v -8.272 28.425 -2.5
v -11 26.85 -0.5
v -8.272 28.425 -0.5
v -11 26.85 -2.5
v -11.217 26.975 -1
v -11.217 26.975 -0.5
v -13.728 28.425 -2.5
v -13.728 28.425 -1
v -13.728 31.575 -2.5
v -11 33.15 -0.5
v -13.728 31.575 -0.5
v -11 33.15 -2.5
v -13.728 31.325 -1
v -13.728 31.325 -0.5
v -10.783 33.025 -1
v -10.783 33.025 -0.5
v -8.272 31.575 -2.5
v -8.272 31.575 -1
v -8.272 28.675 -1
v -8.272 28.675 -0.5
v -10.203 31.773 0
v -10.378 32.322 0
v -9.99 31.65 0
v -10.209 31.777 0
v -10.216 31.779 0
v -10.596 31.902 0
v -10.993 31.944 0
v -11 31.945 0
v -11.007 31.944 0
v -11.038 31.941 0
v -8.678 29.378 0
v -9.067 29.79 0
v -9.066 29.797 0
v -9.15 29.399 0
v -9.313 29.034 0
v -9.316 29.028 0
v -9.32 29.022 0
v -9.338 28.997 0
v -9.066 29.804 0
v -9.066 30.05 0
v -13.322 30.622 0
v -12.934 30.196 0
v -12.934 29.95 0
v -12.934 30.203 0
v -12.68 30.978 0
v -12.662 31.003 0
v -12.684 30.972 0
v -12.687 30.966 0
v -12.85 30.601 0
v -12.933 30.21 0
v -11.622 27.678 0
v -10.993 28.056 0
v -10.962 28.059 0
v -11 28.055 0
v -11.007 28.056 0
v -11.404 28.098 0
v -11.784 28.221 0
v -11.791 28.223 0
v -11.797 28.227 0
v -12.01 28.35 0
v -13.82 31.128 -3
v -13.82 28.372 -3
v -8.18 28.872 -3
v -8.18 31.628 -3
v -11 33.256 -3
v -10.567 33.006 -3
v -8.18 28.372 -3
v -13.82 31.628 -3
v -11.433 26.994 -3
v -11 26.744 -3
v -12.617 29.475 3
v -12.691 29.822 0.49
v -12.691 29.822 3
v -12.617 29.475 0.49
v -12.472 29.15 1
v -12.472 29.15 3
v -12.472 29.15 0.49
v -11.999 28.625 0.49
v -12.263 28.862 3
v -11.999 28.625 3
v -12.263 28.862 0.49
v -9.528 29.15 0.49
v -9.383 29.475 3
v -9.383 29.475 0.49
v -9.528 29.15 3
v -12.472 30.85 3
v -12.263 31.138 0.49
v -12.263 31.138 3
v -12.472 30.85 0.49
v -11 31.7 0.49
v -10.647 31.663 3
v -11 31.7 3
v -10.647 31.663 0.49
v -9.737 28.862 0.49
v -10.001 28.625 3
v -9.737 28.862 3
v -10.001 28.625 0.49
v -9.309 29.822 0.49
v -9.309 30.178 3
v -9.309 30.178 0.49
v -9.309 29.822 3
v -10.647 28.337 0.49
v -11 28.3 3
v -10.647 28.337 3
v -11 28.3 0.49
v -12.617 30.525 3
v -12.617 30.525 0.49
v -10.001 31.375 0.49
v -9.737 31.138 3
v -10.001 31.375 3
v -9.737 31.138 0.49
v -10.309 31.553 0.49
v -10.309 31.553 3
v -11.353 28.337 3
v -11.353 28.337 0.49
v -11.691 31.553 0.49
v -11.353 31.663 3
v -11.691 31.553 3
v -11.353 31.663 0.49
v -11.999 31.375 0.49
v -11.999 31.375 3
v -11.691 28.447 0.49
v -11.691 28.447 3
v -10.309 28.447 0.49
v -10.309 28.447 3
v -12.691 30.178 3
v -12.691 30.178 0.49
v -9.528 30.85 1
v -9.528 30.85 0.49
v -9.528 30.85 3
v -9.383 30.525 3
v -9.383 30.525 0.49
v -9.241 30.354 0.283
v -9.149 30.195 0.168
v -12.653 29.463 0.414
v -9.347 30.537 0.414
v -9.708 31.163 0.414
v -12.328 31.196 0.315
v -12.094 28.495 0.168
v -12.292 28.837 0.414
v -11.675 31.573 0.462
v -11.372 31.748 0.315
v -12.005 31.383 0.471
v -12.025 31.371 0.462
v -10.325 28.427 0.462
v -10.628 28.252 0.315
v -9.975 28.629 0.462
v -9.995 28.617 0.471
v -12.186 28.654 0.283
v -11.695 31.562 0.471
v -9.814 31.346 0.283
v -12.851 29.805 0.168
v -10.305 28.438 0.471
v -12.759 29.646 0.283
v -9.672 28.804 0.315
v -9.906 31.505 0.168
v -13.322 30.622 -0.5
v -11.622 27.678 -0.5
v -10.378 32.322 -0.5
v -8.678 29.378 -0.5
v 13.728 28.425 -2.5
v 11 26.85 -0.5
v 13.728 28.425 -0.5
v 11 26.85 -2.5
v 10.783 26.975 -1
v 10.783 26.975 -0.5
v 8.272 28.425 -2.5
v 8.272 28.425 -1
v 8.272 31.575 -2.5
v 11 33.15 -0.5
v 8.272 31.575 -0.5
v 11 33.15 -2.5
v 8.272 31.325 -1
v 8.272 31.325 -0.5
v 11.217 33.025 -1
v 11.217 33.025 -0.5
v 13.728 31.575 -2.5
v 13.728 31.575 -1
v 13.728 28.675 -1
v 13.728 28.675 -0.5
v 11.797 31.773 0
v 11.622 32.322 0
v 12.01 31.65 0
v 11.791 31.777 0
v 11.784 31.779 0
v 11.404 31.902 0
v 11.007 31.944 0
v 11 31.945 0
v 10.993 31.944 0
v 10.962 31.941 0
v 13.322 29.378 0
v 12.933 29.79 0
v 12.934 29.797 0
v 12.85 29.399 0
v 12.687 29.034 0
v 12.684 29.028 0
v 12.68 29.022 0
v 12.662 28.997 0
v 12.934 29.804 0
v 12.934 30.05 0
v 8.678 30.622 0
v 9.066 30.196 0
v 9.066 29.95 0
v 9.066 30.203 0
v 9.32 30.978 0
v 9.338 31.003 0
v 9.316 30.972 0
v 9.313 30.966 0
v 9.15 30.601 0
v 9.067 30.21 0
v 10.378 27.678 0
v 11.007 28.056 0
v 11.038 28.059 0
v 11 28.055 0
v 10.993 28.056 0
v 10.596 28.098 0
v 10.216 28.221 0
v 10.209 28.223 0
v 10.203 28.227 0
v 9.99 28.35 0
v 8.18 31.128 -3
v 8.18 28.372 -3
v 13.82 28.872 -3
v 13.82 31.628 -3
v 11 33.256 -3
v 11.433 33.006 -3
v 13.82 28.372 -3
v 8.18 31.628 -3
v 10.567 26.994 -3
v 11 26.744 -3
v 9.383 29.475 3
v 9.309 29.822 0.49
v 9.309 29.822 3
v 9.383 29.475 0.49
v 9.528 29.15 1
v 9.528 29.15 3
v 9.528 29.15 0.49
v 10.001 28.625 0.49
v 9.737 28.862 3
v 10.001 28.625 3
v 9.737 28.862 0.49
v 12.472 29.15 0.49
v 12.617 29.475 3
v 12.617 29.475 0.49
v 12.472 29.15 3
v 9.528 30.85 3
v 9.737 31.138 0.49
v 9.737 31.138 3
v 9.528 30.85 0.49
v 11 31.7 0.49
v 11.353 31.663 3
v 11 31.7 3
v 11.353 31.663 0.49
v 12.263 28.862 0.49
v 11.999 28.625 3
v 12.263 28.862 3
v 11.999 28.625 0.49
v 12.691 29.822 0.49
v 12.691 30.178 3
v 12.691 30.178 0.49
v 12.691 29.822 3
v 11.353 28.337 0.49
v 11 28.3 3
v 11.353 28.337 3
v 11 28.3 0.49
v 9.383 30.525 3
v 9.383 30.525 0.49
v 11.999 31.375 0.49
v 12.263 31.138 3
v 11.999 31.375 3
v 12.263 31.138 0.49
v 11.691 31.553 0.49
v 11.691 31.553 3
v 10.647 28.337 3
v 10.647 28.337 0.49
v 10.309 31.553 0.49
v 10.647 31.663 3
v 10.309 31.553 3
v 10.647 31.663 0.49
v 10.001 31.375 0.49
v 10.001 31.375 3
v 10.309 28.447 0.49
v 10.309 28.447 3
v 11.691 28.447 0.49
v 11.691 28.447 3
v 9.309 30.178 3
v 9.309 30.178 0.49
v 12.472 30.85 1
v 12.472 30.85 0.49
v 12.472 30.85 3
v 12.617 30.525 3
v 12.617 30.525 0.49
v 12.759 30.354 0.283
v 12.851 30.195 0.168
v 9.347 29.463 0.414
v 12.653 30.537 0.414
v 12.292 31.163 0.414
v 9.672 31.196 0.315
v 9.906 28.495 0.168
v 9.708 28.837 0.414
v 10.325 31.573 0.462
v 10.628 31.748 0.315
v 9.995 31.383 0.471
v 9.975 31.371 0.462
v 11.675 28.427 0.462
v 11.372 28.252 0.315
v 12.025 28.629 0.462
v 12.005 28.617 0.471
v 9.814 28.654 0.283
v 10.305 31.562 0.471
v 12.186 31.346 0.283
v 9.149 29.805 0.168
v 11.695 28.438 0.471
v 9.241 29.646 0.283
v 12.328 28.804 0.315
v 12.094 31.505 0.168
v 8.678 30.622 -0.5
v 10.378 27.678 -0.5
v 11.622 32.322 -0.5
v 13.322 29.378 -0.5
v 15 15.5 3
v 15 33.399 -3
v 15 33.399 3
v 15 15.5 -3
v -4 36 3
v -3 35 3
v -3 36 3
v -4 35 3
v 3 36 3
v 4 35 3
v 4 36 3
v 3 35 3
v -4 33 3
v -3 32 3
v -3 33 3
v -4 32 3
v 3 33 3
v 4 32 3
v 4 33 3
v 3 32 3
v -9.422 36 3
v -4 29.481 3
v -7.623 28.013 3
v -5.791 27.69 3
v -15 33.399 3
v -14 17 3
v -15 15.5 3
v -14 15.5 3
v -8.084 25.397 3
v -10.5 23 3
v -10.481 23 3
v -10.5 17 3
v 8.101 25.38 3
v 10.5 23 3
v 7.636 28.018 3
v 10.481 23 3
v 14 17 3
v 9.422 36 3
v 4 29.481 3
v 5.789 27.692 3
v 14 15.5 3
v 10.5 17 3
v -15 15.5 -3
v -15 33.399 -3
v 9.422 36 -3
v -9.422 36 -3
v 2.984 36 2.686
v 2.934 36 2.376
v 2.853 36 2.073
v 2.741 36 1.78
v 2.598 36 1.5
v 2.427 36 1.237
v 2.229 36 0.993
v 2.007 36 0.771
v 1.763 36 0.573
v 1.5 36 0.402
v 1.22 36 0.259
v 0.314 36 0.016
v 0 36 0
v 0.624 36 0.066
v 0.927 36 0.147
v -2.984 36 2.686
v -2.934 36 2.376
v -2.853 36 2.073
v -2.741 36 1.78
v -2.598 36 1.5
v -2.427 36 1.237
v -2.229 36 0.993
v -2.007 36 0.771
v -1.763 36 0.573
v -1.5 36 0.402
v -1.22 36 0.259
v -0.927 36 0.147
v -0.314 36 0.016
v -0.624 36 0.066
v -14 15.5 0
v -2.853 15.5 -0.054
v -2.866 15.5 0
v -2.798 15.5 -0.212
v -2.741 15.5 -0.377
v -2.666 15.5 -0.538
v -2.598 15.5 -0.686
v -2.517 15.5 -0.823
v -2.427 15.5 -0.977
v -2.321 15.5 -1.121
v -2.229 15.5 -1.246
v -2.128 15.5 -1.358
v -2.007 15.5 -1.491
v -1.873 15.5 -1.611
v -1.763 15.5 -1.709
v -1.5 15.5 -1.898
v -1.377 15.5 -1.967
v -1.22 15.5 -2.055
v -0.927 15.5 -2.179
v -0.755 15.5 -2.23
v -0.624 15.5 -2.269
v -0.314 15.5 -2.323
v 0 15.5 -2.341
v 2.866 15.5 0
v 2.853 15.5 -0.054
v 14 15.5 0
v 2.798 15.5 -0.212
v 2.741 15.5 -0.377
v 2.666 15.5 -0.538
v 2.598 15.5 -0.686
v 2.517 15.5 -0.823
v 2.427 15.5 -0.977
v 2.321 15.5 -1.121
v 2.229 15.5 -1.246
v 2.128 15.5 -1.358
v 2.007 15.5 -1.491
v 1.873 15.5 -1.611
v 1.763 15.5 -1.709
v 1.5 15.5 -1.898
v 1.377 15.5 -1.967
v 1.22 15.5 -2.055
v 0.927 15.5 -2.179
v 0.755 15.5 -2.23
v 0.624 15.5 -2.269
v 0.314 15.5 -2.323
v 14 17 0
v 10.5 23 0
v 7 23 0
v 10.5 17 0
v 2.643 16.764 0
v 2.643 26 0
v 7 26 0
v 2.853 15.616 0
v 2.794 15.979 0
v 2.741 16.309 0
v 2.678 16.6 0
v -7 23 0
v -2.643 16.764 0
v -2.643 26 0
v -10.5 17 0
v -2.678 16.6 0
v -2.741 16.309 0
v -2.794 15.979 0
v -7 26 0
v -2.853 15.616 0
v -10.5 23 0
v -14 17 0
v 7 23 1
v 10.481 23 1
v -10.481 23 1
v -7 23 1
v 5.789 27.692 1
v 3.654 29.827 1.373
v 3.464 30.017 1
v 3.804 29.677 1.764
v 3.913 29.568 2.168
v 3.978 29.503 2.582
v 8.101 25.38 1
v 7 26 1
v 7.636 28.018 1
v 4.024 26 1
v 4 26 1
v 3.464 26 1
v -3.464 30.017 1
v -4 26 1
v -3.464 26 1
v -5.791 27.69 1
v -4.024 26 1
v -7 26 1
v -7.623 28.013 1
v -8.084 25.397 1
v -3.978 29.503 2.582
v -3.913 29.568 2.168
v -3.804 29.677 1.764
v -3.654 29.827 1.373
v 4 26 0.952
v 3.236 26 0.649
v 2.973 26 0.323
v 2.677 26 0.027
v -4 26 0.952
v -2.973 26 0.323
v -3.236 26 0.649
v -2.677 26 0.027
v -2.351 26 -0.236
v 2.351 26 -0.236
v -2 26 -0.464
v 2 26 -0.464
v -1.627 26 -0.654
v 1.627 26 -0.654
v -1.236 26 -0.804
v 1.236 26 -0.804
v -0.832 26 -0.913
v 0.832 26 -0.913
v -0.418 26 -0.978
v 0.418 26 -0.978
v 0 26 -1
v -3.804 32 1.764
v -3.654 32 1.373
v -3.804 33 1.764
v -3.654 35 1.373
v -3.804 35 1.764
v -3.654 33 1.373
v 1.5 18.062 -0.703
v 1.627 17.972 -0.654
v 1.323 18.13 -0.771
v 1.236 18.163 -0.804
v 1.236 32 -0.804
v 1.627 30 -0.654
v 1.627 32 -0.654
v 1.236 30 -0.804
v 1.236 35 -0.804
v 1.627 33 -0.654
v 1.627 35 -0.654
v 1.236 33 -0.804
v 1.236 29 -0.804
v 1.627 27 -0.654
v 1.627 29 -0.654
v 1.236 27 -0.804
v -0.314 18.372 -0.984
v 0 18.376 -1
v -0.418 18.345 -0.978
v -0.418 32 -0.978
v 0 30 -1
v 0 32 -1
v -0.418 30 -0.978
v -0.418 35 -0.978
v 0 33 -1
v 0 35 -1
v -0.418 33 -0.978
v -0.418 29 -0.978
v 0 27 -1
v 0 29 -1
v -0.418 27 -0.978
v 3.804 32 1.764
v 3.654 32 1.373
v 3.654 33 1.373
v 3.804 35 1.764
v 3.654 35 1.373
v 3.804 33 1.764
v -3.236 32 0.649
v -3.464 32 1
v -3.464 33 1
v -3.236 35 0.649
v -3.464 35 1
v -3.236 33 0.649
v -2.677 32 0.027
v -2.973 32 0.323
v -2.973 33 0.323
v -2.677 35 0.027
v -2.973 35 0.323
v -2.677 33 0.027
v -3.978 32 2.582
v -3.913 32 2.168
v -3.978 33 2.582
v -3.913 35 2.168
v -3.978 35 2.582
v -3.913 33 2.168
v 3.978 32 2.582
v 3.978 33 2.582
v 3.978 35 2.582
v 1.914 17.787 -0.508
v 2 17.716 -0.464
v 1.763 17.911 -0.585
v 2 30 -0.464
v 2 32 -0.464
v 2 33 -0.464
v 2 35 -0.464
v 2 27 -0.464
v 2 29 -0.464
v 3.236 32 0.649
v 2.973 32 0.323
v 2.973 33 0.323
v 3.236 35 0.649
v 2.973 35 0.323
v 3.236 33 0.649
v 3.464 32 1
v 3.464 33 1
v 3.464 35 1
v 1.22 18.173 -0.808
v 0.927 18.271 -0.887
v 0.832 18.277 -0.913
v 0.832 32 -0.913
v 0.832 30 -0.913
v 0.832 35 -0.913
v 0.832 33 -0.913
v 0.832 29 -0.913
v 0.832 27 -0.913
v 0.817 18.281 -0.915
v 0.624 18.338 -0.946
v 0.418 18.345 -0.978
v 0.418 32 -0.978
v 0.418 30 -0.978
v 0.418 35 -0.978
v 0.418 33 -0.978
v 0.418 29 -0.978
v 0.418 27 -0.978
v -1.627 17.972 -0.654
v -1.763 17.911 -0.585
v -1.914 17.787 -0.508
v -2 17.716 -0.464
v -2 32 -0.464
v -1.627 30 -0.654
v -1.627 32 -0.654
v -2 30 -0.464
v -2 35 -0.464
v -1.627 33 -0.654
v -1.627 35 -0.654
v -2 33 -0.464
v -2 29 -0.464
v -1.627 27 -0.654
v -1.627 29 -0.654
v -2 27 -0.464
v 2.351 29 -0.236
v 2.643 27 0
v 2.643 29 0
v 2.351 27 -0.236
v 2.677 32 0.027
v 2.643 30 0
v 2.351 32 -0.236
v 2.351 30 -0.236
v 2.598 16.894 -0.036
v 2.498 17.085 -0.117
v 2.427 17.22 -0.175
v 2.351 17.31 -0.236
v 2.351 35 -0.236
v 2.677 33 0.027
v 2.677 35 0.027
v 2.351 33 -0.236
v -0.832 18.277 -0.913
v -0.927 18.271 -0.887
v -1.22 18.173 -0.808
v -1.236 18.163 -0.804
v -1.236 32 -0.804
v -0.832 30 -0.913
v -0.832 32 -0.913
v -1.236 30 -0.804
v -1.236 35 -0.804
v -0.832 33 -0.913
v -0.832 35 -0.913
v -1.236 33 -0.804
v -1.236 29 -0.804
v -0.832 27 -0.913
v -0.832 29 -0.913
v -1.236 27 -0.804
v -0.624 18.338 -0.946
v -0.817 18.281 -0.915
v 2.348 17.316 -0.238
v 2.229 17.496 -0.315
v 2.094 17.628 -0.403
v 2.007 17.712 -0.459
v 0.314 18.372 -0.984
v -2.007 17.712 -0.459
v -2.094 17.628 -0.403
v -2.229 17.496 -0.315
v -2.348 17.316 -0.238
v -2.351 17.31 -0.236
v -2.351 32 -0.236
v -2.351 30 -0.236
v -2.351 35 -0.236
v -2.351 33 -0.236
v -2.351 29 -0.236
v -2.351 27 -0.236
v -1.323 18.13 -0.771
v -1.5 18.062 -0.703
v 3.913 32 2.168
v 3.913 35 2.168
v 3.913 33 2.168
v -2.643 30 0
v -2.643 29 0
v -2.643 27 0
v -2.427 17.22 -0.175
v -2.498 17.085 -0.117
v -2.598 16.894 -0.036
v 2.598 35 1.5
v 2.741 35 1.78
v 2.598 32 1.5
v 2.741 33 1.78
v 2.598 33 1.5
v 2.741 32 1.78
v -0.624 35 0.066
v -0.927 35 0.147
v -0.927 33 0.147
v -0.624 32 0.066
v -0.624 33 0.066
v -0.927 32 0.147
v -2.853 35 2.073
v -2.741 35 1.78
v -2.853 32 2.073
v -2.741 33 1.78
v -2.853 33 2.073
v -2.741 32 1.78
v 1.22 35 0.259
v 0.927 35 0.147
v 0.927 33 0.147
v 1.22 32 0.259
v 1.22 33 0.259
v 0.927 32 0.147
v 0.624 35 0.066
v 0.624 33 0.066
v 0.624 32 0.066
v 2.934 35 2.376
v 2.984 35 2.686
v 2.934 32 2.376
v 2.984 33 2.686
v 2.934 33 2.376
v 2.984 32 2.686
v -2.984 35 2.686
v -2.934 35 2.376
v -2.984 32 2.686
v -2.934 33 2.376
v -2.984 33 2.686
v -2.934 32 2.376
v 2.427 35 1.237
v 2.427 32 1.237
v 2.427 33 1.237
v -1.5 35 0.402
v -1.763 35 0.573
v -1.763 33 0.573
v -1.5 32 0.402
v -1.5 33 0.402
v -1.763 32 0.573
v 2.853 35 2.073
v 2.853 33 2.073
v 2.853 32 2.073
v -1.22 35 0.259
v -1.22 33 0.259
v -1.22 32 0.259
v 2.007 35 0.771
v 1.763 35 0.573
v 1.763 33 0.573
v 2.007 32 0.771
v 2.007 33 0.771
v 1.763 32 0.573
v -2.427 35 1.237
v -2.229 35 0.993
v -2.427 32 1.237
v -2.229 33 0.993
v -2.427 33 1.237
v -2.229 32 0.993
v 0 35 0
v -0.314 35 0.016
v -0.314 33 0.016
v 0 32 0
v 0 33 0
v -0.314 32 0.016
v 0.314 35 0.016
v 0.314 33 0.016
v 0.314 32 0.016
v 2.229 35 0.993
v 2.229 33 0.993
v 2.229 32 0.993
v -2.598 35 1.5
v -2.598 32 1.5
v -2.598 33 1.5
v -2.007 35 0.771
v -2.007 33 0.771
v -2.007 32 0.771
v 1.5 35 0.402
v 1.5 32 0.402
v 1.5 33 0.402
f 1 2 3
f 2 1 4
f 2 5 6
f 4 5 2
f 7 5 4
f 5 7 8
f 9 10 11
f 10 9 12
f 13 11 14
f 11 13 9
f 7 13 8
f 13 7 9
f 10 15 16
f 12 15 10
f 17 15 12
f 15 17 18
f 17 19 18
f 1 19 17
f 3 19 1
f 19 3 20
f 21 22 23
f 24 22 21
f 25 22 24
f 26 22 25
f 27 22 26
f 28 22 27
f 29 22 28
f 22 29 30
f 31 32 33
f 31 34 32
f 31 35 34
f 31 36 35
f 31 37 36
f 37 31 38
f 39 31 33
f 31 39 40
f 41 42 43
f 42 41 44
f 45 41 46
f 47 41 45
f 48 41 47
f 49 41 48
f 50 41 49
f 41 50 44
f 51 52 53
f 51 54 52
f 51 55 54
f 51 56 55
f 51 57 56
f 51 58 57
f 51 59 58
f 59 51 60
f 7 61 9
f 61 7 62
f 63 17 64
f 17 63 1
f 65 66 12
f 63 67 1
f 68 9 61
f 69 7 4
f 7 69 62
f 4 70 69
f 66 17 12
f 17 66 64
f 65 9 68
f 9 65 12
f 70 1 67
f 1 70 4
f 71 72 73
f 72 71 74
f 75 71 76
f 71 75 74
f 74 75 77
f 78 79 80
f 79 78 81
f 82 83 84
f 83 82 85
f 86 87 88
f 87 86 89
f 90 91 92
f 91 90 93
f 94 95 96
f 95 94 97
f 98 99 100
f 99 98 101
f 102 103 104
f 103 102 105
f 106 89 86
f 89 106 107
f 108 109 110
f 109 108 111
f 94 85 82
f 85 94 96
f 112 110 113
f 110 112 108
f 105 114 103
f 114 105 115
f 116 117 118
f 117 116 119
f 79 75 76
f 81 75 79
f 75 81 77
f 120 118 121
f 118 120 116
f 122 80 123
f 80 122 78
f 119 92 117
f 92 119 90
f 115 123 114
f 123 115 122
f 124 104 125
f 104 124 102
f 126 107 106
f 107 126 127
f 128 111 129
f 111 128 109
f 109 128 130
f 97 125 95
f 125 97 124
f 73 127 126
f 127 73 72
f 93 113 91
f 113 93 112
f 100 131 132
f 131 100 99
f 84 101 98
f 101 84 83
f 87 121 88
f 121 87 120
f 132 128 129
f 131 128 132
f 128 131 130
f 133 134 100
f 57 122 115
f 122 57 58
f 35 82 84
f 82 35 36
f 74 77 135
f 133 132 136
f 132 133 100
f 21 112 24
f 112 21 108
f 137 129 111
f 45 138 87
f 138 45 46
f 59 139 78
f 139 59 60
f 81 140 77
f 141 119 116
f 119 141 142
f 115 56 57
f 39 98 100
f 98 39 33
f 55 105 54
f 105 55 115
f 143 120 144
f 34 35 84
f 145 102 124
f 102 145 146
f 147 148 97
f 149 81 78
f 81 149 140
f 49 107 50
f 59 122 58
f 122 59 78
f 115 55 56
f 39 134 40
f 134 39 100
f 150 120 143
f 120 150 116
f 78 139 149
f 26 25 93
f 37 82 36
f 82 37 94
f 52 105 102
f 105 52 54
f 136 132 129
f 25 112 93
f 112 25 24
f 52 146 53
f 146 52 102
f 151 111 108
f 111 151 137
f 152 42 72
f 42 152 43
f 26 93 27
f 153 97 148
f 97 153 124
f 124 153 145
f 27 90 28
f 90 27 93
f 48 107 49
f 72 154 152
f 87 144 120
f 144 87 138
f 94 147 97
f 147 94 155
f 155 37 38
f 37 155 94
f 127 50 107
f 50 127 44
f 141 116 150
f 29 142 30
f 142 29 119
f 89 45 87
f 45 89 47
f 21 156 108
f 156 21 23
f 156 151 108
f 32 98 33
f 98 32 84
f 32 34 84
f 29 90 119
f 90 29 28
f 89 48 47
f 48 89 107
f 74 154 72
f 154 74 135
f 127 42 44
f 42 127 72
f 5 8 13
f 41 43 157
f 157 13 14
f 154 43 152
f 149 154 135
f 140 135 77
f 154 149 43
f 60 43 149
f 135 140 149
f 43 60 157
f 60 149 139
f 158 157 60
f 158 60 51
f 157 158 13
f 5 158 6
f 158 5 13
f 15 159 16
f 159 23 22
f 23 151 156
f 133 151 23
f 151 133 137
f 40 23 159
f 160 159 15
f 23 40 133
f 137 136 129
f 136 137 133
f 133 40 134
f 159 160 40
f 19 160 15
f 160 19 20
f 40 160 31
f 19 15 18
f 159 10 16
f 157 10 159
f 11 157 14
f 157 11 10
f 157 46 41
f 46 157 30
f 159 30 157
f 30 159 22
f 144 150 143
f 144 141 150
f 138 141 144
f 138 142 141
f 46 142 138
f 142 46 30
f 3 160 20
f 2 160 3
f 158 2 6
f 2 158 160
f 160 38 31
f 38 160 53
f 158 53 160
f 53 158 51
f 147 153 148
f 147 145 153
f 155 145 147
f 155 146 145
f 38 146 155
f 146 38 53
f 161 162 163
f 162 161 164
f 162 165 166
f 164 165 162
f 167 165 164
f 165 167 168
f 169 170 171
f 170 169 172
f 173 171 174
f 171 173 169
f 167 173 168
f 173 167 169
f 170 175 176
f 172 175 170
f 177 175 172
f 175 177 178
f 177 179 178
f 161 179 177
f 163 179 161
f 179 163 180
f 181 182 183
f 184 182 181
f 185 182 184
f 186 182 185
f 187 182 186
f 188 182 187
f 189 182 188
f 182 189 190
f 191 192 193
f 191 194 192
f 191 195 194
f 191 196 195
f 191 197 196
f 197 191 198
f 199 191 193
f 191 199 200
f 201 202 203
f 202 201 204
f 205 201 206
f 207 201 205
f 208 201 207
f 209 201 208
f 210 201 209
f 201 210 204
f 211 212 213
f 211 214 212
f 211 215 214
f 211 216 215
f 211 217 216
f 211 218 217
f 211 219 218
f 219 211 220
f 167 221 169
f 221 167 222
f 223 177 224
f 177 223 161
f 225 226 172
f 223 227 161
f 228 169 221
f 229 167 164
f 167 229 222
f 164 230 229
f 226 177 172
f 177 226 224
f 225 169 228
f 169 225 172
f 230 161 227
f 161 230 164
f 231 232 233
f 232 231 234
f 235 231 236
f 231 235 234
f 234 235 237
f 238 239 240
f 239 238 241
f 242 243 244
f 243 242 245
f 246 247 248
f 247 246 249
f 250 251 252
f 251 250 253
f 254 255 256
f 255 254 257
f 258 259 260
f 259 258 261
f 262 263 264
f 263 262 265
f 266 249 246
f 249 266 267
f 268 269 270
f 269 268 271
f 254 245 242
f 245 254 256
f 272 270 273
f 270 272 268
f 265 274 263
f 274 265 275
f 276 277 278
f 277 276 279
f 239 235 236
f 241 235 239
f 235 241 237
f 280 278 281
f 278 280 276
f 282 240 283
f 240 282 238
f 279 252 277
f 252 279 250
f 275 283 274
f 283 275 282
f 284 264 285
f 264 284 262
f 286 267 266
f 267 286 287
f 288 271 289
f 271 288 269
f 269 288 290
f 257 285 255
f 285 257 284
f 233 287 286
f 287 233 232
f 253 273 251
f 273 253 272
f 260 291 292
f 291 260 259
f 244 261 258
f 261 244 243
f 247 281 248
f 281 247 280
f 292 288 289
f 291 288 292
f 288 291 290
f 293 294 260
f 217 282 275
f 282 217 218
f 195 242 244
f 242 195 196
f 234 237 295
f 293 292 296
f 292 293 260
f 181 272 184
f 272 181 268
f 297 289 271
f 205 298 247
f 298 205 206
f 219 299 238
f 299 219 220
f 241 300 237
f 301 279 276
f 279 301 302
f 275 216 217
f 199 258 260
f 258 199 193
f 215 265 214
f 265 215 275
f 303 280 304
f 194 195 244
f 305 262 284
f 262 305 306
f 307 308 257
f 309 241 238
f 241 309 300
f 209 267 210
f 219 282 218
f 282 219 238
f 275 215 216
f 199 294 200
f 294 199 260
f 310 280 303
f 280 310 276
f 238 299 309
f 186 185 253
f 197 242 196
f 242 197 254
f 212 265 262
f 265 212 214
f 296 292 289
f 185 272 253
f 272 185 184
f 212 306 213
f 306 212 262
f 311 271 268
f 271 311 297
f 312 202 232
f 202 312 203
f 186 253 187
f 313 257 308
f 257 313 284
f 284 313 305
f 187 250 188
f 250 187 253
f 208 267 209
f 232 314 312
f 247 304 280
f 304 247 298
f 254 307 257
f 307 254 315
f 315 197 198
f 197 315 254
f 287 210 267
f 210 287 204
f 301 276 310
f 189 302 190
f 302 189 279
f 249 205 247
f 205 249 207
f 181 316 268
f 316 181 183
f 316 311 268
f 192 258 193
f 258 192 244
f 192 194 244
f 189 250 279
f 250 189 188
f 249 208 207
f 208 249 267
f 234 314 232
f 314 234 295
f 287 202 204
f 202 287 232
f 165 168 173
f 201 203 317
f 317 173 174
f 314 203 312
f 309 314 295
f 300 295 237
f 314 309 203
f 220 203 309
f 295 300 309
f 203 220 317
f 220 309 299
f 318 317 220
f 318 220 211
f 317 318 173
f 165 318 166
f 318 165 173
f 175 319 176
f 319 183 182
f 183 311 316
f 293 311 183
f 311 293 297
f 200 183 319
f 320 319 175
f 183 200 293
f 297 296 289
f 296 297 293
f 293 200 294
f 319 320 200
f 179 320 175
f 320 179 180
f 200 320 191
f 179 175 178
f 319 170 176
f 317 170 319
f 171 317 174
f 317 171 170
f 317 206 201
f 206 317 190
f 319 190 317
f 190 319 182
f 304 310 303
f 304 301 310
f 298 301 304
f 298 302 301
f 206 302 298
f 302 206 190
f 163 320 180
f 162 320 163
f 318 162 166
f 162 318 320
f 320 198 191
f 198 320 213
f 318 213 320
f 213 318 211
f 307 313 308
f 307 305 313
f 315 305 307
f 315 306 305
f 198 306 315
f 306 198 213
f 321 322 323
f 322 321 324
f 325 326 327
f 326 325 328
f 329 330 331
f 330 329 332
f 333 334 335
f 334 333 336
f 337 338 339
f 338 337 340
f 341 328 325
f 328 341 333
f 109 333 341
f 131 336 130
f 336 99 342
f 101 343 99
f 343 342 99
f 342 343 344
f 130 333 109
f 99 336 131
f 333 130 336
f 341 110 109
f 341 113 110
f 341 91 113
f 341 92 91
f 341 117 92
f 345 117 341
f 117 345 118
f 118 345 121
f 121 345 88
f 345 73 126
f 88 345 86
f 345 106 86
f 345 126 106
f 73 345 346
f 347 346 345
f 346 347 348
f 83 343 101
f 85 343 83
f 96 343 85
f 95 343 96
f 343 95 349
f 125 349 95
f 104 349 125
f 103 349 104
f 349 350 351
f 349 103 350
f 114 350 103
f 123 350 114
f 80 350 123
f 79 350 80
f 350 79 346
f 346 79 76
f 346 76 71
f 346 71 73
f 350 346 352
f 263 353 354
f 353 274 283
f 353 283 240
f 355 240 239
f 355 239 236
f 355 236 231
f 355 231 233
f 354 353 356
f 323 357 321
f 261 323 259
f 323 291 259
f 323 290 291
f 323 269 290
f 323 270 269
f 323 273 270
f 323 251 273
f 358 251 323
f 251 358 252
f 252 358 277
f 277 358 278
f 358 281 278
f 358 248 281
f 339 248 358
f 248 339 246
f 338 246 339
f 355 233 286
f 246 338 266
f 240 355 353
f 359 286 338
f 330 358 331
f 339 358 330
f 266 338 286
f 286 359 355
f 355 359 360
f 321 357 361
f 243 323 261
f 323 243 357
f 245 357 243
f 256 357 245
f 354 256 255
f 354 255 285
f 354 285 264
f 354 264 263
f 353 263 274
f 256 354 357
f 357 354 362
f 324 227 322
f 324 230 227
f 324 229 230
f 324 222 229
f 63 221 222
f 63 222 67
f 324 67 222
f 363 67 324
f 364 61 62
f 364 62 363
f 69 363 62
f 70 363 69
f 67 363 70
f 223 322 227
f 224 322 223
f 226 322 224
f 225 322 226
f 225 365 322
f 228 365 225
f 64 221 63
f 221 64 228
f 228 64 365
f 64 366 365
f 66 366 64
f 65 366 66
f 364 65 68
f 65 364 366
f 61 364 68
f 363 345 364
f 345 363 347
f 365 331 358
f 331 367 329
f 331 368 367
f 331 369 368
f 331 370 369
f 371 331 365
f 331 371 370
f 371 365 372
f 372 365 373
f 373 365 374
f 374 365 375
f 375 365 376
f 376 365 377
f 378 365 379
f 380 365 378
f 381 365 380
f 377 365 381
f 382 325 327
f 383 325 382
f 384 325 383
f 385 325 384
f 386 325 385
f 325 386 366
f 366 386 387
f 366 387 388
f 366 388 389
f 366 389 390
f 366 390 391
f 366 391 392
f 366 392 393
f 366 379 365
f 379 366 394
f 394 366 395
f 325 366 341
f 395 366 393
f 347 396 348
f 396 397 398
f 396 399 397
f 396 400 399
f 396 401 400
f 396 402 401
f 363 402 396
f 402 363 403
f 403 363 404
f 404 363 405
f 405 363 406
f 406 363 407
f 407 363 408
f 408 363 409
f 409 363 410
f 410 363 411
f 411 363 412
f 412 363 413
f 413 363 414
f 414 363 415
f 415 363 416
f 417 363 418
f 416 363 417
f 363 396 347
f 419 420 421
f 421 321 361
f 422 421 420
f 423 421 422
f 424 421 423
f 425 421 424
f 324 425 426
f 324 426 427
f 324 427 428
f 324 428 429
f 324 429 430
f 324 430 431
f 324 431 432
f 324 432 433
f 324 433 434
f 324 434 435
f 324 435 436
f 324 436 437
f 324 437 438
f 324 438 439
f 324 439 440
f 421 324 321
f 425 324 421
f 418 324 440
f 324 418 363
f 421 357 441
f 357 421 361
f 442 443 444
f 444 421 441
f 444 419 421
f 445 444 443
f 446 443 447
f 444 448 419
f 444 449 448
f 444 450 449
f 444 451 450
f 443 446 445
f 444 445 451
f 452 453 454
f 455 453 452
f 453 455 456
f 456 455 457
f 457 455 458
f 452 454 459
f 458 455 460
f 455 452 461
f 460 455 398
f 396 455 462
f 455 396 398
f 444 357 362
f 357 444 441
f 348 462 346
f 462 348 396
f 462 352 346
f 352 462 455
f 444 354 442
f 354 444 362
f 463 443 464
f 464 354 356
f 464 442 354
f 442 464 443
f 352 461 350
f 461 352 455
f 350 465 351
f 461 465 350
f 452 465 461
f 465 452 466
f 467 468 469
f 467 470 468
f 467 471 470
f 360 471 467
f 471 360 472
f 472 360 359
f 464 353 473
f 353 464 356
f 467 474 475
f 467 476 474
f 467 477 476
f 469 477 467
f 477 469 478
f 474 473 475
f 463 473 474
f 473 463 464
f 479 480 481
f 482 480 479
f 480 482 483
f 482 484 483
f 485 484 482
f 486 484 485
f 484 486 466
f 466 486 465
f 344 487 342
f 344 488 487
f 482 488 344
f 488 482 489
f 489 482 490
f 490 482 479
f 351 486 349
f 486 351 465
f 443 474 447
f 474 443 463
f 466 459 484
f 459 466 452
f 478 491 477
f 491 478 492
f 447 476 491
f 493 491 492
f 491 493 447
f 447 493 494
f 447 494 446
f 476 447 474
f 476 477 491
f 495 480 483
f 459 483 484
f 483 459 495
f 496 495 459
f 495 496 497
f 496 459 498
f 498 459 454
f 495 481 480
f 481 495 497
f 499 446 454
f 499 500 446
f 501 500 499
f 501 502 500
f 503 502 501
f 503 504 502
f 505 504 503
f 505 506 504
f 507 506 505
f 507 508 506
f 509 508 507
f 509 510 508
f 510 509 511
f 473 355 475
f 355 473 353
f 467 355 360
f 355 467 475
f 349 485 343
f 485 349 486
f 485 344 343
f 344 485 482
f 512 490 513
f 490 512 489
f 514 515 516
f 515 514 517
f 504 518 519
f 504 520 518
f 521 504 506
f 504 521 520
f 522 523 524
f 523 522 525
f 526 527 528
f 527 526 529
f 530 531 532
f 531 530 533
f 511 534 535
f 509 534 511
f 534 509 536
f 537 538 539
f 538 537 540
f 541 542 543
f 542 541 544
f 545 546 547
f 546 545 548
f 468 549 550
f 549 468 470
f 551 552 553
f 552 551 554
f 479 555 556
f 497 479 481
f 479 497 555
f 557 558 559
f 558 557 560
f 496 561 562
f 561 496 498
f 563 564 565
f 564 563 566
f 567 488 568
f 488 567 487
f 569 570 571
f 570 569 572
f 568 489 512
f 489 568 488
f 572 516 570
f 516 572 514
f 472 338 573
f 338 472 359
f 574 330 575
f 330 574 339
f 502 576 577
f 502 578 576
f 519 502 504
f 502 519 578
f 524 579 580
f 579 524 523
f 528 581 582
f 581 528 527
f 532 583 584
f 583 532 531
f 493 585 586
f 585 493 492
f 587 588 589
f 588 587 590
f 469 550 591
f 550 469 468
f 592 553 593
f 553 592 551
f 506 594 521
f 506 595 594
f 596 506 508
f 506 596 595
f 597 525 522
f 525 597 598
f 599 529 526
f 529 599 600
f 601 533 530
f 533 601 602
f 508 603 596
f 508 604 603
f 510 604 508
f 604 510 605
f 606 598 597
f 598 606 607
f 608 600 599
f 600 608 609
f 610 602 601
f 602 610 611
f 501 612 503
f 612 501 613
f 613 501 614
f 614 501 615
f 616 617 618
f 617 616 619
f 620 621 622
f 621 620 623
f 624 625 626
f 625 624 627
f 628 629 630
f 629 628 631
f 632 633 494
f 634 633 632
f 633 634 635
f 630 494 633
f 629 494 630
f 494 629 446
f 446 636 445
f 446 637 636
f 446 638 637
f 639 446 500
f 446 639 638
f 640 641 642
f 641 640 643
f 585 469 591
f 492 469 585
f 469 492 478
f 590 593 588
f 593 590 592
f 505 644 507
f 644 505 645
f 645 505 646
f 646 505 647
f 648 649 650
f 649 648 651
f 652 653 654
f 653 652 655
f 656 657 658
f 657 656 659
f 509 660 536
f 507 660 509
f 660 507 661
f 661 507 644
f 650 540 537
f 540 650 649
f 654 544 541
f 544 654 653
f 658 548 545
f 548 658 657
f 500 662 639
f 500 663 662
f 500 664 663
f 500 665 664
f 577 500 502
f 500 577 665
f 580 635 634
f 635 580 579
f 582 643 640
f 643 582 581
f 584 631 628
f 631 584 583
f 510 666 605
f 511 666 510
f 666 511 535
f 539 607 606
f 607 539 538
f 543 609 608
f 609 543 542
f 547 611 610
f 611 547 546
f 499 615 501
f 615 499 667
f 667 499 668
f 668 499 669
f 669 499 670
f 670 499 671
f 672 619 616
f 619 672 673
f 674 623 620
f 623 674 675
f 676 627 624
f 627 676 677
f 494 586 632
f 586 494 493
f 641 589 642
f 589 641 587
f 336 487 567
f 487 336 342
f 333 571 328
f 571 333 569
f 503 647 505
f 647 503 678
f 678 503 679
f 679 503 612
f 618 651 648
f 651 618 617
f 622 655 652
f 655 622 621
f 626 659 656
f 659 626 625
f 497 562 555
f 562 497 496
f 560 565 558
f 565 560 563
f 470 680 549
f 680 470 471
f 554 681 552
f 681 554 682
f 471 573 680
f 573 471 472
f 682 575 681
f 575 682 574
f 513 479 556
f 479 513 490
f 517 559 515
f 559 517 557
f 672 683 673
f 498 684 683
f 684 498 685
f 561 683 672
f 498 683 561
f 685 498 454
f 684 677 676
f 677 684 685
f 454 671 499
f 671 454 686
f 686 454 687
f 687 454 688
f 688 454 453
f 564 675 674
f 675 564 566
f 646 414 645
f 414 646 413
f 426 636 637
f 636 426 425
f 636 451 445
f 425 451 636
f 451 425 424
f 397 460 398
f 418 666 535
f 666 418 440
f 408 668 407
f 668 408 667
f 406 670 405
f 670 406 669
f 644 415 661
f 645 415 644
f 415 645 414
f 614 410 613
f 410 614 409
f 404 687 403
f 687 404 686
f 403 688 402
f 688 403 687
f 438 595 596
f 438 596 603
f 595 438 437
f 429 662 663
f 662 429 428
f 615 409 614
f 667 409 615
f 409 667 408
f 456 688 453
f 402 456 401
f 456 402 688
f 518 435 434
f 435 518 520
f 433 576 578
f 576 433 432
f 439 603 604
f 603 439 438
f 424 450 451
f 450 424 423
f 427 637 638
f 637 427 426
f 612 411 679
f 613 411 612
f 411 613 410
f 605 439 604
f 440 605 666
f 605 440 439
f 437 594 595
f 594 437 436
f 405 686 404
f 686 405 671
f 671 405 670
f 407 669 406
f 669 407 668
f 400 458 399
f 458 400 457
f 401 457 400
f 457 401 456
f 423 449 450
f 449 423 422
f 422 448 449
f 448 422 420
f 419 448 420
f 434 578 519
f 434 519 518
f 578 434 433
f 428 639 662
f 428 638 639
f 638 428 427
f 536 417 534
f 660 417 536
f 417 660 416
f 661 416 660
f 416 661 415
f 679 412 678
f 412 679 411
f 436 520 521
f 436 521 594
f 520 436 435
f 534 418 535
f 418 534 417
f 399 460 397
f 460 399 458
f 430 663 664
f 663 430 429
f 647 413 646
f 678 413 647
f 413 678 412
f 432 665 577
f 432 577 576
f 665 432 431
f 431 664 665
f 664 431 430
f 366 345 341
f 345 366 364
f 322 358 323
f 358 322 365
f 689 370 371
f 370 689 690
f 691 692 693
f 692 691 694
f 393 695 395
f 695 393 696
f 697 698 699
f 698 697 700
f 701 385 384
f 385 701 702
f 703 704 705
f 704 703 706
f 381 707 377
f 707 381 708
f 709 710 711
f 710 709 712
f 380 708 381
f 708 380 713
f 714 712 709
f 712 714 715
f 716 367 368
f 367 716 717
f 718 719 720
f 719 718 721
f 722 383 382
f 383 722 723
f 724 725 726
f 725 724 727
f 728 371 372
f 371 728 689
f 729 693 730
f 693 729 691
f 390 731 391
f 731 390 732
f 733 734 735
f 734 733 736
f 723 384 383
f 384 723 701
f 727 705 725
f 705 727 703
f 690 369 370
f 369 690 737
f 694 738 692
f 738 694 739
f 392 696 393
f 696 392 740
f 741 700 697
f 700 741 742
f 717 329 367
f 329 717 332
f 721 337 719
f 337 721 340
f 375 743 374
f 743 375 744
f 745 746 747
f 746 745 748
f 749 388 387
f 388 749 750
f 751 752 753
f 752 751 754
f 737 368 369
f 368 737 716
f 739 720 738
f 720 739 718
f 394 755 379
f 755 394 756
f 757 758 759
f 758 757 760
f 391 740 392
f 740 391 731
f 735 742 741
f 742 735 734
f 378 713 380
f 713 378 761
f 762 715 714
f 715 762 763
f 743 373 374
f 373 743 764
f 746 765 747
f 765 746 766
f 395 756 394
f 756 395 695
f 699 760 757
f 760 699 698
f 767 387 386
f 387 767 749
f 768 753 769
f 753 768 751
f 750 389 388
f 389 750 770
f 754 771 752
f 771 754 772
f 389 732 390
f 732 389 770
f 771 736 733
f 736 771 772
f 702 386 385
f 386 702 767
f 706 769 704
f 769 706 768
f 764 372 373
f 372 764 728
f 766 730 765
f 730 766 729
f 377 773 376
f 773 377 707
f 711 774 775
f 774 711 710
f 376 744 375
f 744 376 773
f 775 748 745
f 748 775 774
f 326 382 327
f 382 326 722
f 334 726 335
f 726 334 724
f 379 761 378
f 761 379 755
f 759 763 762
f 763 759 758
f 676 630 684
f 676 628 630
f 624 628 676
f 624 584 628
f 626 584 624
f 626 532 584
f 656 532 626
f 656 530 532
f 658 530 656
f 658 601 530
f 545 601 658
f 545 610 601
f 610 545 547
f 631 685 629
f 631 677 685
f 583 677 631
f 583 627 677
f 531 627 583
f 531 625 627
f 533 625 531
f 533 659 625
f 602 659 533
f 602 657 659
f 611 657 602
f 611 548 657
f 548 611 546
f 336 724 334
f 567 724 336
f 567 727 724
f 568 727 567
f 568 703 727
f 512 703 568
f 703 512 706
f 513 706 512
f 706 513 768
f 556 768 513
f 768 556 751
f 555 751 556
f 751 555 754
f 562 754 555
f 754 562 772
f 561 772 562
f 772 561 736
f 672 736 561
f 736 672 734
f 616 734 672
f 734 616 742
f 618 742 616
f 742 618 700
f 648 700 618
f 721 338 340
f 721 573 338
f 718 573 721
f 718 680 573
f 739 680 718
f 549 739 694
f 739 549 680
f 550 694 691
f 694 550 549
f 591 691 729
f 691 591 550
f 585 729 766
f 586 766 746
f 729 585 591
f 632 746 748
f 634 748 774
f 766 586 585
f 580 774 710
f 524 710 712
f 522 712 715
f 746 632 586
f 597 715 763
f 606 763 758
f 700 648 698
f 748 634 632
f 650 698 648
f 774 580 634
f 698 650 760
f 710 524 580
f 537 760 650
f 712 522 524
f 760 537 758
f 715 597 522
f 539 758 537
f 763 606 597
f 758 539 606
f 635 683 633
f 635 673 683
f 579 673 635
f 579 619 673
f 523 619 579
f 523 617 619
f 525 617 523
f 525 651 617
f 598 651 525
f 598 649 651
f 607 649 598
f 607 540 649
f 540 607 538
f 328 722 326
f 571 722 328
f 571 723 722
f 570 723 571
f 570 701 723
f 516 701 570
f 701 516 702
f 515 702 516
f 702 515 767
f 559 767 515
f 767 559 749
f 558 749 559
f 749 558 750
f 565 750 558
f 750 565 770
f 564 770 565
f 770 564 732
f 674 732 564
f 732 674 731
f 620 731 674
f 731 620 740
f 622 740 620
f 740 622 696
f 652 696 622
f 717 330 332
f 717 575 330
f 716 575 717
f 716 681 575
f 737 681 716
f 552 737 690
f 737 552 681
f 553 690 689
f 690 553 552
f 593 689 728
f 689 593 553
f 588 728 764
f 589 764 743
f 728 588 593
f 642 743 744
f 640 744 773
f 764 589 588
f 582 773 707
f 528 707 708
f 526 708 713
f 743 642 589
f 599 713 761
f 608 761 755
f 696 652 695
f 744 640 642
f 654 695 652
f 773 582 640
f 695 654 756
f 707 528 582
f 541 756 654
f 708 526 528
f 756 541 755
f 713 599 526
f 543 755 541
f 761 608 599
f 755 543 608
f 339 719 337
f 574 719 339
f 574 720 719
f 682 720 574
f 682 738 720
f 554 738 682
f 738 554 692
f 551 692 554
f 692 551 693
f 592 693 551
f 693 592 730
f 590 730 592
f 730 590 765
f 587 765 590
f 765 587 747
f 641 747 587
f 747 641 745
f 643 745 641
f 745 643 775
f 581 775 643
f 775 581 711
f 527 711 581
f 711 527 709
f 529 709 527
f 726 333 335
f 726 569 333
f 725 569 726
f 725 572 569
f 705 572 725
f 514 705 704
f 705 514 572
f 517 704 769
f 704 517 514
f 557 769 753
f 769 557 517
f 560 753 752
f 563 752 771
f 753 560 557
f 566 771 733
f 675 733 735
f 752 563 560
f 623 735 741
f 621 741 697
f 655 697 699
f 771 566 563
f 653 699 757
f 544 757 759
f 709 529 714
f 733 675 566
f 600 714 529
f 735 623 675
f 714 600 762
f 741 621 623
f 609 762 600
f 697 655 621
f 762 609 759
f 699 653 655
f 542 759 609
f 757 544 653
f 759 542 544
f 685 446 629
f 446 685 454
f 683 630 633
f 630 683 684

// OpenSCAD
// PRUSA iteration4
// Heatbed cable cover clip MK3S
// GNU GPL v3
// Josef Průša <iam@josefprusa.cz> and contributors
// http://www.reprap.org/wiki/Prusa_Mendel
// http://prusamendel.org

module m3_nut() {
  difference() {
    union() {
      cylinder(h=4, r=3.15, $fn=6);
      translate([0, 0, 2.5]) cylinder(h=4, r1=3.15, r2=4, $fn=6);
      translate([0, 0, -9]) cylinder(h=12, r=1.7, $fn=30);
      translate([0, 0, -0.49]) cylinder(h=0.5, r1=1.7, r2=1.95, $fn=30);
    }
    translate([1.7, -5, -1]) cube([5, 10, 2]);
    translate([-6.7, -5, -1]) cube([5, 10, 2]);

    translate([-5, 1.7, -1.5]) cube([10, 5, 2]);
    translate([-5, -6.7, -1.5]) cube([10, 5, 2]);
  }
}

module clip() {

  difference() {
    // base body
    translate([-15, 15.5, -3]) cube([30, 20.5, 6]);

    // inner angled cut
    translate([3.5, 2, 0]) rotate([0, 0, 0]) cube([10.5, 15, 6]);
    translate([-14, 2, 0]) rotate([0, 0, 0]) cube([10.5, 15, 6]);

    translate([3.5, 15, 0]) rotate([0, 0, 0]) cube([7, 8, 6]);
    translate([-10.5, 15, 0]) rotate([0, 0, 0]) cube([7, 8, 6]);

    translate([6.96, 19.45, 1]) rotate([0, 0, 45]) cube([5, 10, 6]);
    translate([-6.96, 19.45, 1]) rotate([0, 0, 45]) cube([10, 5, 6]);

    translate([-0, 37, 3]) rotate([90, 0, 0]) cylinder(h=17, r=3.5, $fn=60);

    translate([-7, 15, 0]) rotate([0, 0, 0]) cube([14, 11, 6]);

    translate([3, 14, 1]) rotate([0, 0, 10]) cube([7, 13, 6]);
    translate([-9.88, 15.21, 1]) rotate([0, 0, -10]) cube([7, 13, 6]);

    // cables cut
    translate([-0, 36, 3]) rotate([90, 0, 0]) cylinder(h=187, r=4, $fn=60);

    translate([-11, 30, 0]) rotate([0, 180, 30]) m3_nut();
    translate([11, 30, 0]) rotate([0, 180, 30]) m3_nut();

    // thermistor cable entry
    translate([-0, 22, 4]) rotate([115, 0, 0]) cylinder(h=15, r=3, $fn=60);

    // edges  
    translate([-18.0, 32, -5]) rotate([0, 0, 25]) cube([11, 11, 15]);
    translate([18, 32, -5]) rotate([0, 0, 65]) cube([11, 11, 15]);
  }

  // cable rims
  difference() {
    difference() {
      translate([-0, 36, 3]) rotate([90, 0, 0]) cylinder(h=10, r=4.5, $fn=60);
      translate([-0, 37, 3]) rotate([90, 0, 0]) cylinder(h=17, r=3, $fn=60);
    }
    translate([-15, 18, 3]) cube([30, 20, 6]);
    translate([-15, 27, -5]) cube([30, 2, 16]);
    translate([-15, 30, -5]) cube([30, 2, 16]);
    translate([-15, 33, -5]) cube([30, 2, 16]);
    translate([6.96, 19.45, 1]) rotate([0, 0, 45]) cube([5, 10, 6]);
    translate([-6.96, 19.45, 1]) rotate([0, 0, 45]) cube([10, 5, 6]);
    translate([-4, 20, 0]) rotate([0, 0, 0]) cube([8, 11, 6]);
  }
}

clip();
